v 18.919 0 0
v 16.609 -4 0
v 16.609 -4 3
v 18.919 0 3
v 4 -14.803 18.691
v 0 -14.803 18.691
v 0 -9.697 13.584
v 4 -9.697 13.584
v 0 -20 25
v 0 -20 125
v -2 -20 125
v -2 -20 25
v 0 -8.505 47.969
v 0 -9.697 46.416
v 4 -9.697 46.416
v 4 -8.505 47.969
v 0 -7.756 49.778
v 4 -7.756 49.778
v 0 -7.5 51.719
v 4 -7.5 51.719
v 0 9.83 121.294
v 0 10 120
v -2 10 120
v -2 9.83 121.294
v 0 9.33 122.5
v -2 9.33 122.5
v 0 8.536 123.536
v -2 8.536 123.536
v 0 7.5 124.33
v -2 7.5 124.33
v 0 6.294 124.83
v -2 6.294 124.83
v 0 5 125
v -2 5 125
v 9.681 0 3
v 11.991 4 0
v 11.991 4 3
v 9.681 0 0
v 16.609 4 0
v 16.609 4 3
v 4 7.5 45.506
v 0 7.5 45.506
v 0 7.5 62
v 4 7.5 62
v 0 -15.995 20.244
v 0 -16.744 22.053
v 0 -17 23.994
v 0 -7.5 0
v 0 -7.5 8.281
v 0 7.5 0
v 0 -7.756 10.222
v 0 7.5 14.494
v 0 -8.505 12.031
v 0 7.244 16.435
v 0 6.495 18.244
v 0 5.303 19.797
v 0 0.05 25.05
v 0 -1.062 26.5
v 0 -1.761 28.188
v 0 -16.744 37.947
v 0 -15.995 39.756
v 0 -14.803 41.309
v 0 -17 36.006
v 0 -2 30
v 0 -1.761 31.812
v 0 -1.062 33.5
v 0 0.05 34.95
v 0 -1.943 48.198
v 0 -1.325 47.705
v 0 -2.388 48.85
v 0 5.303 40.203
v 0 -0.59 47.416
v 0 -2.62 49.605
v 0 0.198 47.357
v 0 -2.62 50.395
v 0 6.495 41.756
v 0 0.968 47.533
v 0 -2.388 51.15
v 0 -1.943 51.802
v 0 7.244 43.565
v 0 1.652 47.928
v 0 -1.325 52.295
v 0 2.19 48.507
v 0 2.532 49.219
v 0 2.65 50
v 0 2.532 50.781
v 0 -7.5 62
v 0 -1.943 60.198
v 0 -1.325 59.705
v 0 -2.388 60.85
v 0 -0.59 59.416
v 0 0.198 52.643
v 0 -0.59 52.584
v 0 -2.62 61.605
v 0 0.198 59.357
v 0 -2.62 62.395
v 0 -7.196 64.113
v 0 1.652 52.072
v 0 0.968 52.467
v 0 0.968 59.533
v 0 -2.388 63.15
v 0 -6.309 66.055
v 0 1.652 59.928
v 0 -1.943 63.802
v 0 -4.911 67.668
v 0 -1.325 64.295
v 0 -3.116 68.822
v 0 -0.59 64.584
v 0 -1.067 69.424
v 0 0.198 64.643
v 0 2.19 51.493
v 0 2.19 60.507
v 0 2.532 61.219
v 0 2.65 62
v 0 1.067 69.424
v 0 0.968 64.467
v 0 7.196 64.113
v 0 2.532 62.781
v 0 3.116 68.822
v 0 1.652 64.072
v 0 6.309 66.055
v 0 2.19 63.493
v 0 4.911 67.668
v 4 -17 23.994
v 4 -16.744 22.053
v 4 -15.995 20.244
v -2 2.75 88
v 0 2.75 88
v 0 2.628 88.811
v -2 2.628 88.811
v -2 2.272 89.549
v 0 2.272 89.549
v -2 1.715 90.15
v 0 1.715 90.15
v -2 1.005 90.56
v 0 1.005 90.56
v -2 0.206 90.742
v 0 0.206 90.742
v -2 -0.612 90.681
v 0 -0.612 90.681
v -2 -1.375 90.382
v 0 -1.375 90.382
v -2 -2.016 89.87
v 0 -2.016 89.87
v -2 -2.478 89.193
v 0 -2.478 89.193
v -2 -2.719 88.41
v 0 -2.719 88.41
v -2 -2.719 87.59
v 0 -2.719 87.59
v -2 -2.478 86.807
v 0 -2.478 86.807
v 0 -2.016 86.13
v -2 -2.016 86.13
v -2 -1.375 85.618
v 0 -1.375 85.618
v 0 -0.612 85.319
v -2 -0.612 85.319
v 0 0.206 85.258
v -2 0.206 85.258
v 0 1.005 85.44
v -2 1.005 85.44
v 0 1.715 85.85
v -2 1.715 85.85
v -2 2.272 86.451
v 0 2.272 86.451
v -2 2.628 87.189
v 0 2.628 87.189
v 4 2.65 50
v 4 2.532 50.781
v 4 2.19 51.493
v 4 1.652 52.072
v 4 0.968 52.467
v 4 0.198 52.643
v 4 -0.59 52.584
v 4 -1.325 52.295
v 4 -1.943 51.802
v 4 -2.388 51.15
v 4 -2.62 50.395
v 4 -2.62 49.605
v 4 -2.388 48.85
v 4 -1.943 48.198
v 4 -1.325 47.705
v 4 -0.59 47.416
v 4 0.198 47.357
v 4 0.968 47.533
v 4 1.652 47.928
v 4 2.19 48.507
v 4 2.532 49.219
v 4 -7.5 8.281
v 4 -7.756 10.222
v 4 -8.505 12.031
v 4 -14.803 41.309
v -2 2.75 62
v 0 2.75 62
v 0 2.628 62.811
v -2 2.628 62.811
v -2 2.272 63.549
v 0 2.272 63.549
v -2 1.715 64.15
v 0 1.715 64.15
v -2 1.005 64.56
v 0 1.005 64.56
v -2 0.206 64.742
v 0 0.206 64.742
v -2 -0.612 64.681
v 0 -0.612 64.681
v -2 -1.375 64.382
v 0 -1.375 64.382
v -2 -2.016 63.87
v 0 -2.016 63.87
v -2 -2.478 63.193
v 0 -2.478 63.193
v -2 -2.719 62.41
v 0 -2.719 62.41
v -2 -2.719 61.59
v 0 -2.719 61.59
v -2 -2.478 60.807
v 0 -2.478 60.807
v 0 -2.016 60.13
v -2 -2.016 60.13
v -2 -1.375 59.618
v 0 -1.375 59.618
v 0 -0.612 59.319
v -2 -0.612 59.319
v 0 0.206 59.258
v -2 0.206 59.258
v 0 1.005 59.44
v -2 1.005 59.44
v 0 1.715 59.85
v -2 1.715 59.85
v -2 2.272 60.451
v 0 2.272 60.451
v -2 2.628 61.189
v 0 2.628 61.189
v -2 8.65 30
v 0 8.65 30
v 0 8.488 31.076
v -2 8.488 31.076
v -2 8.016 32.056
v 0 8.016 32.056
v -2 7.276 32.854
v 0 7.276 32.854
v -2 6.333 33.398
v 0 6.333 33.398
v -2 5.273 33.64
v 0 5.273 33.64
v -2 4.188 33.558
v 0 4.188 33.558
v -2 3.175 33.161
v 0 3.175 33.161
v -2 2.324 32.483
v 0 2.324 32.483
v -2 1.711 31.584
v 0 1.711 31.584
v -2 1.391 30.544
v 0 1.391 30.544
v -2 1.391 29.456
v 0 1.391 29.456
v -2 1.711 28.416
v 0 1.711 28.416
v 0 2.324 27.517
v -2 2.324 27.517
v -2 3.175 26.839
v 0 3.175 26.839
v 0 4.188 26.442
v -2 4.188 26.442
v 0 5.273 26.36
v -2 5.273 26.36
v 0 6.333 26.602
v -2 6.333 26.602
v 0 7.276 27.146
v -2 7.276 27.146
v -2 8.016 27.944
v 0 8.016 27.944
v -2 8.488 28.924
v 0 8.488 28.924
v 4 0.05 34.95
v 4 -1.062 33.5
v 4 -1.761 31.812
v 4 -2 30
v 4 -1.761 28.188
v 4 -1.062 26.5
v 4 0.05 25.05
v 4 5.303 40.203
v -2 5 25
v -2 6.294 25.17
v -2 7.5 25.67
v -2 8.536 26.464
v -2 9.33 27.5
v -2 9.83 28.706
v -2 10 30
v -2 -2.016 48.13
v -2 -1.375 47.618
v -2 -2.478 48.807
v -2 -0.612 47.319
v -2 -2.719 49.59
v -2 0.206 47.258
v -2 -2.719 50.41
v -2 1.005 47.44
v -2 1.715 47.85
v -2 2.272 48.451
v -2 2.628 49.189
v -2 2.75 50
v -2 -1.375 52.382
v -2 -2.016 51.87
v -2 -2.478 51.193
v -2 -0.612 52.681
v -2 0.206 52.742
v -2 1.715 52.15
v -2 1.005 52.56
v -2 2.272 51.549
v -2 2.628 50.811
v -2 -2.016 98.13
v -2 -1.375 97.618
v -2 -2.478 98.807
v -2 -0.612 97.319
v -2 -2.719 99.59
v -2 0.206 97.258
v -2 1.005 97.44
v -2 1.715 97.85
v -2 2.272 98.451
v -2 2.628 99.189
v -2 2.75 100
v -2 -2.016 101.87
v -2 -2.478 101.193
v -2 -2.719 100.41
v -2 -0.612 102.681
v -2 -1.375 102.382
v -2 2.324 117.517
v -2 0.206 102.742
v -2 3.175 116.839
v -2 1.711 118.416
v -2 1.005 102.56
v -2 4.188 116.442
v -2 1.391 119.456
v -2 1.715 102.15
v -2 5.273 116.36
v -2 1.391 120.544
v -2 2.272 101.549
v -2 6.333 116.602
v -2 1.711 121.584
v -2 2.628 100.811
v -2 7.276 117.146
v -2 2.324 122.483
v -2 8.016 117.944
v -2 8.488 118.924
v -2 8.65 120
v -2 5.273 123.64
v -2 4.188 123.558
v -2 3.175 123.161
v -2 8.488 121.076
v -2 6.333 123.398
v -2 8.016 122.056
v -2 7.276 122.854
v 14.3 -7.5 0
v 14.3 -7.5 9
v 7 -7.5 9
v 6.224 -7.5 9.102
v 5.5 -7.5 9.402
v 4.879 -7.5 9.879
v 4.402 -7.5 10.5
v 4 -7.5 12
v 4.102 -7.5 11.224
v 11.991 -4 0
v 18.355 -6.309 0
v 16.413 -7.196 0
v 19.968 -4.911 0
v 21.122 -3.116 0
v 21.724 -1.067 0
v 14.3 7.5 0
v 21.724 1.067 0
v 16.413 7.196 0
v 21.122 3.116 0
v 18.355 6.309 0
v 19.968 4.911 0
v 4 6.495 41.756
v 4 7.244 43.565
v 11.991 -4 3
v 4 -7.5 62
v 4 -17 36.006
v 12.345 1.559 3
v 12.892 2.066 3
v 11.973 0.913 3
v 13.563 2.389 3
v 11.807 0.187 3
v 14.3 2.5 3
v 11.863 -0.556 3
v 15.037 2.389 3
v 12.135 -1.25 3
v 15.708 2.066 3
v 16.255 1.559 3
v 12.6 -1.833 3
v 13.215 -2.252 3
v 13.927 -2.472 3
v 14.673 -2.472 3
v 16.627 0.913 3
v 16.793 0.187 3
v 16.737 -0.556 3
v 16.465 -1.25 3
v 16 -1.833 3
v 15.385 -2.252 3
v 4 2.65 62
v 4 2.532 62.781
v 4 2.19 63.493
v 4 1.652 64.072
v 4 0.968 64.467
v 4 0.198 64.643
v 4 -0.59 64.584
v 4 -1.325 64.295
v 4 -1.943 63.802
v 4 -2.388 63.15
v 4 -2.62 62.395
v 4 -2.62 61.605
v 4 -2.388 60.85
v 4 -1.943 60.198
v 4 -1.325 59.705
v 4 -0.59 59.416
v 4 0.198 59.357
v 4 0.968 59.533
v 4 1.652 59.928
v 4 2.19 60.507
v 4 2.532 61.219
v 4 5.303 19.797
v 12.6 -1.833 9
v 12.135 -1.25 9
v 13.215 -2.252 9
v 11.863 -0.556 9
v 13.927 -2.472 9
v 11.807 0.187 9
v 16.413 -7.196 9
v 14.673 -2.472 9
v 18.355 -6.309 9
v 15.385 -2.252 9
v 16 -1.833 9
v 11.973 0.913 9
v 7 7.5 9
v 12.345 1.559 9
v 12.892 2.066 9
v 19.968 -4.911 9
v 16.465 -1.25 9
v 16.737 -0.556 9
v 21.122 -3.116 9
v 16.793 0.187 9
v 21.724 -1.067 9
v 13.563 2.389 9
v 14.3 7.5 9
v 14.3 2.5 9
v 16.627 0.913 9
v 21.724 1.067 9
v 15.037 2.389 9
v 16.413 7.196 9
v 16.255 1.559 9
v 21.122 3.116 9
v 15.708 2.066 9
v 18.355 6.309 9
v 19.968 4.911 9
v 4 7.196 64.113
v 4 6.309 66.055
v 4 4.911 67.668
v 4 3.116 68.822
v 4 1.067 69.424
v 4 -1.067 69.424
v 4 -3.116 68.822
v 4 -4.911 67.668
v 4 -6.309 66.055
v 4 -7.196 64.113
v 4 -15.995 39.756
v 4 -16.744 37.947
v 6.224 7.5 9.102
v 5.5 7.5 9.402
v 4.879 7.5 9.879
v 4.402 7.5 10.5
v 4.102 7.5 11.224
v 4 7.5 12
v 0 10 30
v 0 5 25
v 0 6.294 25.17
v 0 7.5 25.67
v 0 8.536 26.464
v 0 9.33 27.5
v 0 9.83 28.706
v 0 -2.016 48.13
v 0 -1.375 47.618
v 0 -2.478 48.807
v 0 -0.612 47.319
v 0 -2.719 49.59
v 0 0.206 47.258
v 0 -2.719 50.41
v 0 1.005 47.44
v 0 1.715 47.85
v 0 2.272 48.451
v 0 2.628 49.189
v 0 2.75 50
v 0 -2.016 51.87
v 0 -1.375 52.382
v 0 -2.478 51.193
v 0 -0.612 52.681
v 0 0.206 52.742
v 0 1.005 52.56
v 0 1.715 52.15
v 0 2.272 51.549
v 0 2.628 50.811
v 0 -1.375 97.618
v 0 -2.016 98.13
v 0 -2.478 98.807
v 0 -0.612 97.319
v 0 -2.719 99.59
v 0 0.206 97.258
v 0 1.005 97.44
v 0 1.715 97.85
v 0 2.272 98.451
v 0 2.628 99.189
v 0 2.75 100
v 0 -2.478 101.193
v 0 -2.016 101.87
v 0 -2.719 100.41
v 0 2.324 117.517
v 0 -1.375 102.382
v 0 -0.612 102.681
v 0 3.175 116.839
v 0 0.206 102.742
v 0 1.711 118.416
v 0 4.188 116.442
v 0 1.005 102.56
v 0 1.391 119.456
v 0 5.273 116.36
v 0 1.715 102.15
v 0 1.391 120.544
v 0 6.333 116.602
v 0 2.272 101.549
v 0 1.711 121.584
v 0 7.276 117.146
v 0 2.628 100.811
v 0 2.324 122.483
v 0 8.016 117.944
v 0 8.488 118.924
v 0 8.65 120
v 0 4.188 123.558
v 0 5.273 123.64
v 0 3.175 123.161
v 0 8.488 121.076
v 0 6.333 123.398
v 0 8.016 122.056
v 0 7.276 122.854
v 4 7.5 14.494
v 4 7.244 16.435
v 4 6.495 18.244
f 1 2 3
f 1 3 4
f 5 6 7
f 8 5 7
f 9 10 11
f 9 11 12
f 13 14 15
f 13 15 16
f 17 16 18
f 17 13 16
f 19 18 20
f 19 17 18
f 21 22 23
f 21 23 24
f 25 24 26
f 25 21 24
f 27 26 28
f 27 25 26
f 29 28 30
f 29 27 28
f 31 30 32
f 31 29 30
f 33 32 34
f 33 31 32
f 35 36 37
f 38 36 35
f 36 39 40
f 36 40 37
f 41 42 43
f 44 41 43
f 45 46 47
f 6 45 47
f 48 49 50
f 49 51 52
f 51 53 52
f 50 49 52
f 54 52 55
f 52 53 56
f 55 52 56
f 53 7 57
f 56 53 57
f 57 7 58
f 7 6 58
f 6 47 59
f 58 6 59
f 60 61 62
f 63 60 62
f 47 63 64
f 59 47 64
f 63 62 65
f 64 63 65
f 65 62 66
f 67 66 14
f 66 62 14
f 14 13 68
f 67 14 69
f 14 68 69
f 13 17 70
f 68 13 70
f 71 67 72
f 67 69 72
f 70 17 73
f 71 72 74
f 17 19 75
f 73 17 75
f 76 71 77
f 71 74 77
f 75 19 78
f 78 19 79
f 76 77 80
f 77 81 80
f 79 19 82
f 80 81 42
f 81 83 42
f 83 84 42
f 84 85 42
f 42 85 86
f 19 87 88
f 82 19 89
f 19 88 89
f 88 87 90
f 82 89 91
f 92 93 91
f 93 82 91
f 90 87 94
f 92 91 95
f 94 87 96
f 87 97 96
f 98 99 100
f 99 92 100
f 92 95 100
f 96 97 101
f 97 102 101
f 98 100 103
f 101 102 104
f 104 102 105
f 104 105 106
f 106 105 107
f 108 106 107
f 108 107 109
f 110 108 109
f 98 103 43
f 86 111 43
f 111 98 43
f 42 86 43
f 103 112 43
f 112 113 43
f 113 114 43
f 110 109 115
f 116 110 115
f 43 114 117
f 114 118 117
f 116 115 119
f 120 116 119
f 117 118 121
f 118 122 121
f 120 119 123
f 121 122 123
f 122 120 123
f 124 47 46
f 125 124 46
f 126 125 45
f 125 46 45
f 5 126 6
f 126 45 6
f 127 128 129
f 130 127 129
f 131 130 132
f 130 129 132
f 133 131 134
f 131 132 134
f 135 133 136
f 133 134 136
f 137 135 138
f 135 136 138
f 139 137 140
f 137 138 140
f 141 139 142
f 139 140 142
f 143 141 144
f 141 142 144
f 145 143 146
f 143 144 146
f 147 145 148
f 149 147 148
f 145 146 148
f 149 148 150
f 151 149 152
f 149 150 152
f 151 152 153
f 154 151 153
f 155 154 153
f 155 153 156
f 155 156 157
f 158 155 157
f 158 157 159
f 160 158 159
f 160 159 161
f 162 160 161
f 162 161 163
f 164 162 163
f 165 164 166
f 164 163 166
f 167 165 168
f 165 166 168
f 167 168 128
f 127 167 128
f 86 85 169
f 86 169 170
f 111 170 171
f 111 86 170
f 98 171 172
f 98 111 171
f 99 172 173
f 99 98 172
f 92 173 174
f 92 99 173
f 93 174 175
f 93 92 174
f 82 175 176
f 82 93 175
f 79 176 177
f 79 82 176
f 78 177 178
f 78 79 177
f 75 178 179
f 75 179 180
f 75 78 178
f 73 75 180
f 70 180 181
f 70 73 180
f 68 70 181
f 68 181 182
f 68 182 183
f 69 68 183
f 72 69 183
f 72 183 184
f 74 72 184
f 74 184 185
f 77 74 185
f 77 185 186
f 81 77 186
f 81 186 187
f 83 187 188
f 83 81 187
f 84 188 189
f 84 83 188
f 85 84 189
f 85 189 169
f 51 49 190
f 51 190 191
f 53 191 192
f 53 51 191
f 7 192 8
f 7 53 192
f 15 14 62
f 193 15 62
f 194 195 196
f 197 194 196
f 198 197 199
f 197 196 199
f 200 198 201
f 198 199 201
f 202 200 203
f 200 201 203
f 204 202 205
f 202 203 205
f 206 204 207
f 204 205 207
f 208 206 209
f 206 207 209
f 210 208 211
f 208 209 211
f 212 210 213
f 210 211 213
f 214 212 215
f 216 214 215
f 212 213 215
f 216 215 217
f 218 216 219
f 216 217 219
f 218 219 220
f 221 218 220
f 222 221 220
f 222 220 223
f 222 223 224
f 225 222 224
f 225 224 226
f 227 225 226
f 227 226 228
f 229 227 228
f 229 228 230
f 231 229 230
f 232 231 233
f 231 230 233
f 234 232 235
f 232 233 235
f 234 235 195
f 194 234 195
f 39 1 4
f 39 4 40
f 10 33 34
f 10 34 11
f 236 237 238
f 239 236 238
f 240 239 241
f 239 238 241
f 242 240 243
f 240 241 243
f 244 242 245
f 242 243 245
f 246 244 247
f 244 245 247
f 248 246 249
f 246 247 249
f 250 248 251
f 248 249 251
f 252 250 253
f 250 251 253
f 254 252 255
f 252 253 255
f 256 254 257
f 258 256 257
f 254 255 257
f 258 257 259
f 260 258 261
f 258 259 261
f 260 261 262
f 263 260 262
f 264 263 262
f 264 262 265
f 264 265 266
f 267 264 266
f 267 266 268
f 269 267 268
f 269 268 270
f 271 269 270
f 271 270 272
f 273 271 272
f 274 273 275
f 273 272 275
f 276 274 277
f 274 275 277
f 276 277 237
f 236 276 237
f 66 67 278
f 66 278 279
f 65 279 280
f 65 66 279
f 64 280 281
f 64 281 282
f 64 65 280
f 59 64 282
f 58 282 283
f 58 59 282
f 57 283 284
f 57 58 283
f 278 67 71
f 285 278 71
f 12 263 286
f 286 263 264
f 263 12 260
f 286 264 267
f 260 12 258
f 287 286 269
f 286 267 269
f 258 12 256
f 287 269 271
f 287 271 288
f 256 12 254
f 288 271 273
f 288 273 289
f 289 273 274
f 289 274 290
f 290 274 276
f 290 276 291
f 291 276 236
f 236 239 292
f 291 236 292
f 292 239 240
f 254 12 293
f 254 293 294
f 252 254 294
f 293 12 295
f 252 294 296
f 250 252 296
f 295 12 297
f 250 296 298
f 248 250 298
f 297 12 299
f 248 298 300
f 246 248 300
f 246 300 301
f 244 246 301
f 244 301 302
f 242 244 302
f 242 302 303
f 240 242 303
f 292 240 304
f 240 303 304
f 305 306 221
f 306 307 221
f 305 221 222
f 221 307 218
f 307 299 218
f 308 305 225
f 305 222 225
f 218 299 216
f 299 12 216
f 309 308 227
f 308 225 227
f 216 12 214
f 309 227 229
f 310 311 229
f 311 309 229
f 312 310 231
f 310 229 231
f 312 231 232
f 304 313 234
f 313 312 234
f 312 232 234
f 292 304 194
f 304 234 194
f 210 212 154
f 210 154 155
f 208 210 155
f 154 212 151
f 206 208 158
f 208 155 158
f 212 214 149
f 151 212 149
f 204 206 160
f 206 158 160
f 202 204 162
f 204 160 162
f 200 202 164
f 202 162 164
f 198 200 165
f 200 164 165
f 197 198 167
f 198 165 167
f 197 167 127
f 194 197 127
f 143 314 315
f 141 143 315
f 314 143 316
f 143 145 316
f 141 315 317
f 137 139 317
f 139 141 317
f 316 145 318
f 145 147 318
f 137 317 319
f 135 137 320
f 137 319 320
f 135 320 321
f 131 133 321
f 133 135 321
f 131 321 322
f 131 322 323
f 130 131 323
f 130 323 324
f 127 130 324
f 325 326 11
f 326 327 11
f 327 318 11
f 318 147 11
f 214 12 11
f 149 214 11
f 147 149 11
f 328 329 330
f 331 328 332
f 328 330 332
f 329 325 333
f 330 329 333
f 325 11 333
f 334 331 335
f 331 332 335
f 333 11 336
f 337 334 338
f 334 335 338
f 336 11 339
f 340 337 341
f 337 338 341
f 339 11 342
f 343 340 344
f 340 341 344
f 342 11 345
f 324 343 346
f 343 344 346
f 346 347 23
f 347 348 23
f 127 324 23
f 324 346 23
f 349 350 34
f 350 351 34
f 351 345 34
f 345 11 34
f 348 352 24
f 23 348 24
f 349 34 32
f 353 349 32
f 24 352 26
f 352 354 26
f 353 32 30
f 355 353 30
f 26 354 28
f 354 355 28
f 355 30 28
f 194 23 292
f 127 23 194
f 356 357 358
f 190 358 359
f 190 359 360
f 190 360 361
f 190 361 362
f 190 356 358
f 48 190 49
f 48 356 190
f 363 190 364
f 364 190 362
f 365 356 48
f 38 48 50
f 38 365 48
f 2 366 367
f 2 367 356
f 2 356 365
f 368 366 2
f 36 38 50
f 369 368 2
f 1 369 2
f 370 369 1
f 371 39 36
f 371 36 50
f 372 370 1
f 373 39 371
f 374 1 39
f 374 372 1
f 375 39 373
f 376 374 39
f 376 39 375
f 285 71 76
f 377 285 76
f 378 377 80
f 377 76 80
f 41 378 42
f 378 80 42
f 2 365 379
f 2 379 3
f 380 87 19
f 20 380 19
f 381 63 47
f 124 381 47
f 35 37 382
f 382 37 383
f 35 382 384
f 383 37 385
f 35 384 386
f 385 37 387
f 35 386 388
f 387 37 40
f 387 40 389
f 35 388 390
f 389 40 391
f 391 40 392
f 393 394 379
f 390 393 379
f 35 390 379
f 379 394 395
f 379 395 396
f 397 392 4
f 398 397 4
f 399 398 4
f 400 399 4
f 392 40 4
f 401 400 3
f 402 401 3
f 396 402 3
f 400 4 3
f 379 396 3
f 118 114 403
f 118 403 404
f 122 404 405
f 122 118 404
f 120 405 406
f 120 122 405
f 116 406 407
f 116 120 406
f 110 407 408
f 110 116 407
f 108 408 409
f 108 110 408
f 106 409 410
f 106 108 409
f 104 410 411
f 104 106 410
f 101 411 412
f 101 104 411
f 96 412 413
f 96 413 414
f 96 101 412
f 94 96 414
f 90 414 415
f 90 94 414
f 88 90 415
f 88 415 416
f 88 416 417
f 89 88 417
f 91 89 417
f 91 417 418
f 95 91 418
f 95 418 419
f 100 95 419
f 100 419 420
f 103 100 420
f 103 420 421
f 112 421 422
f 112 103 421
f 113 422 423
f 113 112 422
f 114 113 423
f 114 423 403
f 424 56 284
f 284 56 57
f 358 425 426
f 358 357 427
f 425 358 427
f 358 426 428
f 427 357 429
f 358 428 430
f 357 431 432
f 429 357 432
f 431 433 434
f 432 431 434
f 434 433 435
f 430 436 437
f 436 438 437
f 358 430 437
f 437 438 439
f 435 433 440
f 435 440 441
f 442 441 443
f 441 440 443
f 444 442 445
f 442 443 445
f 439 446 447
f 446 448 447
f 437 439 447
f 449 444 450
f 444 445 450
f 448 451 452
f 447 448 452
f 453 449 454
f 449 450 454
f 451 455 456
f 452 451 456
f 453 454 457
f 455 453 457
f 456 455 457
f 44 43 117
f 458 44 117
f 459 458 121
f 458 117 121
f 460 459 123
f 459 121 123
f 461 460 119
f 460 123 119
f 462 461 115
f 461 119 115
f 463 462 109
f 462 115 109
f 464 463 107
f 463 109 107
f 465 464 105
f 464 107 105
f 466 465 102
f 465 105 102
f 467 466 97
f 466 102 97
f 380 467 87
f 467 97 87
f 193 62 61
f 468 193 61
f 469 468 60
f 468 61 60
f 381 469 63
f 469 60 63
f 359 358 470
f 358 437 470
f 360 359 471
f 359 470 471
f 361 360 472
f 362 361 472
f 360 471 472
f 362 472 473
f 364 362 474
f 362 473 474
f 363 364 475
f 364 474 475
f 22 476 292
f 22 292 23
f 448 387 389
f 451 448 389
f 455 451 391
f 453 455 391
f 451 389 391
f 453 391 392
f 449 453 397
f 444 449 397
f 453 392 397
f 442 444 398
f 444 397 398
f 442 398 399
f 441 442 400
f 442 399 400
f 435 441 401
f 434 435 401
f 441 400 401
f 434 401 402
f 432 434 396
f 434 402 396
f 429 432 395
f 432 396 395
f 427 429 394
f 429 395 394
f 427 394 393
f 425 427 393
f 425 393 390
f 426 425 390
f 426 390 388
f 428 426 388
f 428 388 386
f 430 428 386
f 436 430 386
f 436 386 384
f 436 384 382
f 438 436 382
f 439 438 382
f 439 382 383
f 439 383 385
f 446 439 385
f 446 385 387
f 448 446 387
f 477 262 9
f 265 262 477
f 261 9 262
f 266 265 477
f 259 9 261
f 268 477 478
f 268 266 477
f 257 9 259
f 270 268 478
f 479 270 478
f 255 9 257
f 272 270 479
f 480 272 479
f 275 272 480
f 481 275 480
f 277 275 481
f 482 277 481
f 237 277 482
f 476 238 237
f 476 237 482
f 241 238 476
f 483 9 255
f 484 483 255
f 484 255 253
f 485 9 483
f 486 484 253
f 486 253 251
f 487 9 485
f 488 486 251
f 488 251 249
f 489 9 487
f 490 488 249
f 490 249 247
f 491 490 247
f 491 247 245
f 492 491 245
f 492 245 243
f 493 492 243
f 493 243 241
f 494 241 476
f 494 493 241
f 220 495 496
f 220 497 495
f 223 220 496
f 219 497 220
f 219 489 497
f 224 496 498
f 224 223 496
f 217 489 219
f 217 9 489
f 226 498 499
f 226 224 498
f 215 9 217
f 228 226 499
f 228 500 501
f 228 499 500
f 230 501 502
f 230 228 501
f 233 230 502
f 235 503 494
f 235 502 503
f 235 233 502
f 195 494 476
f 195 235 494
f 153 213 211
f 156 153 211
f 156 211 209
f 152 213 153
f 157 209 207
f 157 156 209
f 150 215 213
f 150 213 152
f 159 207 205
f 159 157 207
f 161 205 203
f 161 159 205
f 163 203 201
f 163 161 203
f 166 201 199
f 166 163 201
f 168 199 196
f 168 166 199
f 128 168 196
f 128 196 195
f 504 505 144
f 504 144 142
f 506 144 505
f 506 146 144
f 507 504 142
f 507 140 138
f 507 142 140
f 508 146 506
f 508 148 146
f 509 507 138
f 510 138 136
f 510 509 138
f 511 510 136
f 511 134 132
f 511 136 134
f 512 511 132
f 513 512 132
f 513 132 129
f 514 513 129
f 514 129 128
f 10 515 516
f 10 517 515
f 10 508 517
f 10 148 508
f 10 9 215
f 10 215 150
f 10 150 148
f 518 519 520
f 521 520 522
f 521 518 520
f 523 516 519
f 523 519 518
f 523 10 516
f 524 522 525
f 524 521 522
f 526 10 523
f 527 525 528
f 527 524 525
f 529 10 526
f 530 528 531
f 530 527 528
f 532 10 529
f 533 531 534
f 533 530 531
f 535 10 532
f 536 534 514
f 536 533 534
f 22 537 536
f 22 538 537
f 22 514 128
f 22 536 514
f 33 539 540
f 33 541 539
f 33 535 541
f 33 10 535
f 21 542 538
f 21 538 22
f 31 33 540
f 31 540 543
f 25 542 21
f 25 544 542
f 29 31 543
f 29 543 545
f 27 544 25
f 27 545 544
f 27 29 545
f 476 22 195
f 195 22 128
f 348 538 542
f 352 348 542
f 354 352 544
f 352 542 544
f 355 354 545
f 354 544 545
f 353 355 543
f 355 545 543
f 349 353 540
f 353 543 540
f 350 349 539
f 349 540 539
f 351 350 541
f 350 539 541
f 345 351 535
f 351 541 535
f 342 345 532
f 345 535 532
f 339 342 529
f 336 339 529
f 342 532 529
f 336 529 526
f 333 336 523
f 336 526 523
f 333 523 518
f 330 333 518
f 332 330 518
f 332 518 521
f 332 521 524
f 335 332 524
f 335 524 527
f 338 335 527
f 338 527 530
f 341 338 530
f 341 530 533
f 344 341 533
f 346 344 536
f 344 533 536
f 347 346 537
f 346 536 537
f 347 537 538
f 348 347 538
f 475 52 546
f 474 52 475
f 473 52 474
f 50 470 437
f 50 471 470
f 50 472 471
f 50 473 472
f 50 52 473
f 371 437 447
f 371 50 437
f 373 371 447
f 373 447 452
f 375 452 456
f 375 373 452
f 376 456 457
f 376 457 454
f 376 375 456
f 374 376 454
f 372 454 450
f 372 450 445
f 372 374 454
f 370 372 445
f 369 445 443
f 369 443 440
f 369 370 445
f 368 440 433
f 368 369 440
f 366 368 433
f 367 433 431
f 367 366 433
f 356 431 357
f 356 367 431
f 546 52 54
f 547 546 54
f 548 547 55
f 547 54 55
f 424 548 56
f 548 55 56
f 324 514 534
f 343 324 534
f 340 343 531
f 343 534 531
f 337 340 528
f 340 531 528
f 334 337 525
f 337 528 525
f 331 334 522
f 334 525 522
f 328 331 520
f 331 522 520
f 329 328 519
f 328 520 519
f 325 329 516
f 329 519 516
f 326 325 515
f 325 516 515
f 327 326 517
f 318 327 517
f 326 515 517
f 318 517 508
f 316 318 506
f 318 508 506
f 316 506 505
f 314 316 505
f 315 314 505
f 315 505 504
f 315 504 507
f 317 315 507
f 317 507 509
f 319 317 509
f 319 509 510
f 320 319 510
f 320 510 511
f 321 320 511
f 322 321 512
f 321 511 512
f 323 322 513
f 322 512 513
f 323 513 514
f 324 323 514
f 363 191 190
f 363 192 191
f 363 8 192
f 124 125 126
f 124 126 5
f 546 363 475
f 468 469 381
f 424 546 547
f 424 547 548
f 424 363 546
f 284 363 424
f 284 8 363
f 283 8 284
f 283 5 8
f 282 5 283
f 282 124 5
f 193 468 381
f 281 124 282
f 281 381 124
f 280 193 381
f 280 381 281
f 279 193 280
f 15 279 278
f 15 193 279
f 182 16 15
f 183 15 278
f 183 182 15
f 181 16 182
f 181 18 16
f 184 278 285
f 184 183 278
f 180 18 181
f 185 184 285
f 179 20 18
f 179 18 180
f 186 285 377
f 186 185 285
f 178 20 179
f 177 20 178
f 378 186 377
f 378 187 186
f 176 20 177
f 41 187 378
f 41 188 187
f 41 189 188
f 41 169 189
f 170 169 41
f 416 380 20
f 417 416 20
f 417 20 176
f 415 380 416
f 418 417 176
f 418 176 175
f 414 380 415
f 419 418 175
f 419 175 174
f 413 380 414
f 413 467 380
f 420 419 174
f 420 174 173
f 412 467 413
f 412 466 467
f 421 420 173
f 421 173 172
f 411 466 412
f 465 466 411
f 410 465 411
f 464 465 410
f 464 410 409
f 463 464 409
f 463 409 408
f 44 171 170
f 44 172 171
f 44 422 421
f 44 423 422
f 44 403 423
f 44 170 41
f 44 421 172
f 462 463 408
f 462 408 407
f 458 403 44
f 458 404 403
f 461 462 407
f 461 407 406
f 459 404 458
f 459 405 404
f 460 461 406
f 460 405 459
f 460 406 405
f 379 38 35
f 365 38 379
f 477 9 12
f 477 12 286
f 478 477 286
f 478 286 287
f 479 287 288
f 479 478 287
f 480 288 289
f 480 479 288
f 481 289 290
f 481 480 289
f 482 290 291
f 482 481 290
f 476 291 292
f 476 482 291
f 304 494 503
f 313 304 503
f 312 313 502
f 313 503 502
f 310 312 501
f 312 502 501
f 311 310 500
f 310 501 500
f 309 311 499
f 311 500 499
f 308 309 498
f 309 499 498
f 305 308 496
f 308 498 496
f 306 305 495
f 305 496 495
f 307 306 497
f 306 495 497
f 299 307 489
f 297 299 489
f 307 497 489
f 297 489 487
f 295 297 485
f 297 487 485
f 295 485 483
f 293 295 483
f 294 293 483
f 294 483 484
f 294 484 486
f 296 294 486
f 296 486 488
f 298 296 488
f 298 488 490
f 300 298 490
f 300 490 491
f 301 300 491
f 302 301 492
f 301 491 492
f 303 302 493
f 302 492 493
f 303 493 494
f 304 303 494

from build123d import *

# Parameters (mm, degrees)
SKETCH_R     = 2.75
SKETCH_R_2   = 3.65
PAD_DEPTH    = 2
SKETCH001_R  = 2.65
PAD001_DEPTH = 4
SKETCH002_R  = 2.5
PAD002_DEPTH = 9
POCKET_DEPTH = 3
FILLET_R     = 3


with BuildPart() as z_plate:
    # Sketch → Pad (new body)
    with BuildSketch(Plane.YZ):
        with BuildLine():
            Line((-20, 25), (5, 25))
            ThreePointArc((5, 25), (8.535534, 26.464466), (10, 30))
            Line((10, 30), (10, 120))
            ThreePointArc((10, 120), (8.535534, 123.535534), (5, 125))
            Line((5, 125), (-20, 125))
            Line((-20, 125), (-20, 25))
        make_face()
        with Locations((0, 100)):
            Circle(SKETCH_R, mode=Mode.SUBTRACT)
        with Locations((0, 88)):
            Circle(SKETCH_R, mode=Mode.SUBTRACT)
        with Locations((0, 62)):
            Circle(SKETCH_R, mode=Mode.SUBTRACT)
        with Locations((0, 50)):
            Circle(SKETCH_R, mode=Mode.SUBTRACT)
        with Locations((5, 120)):
            Circle(SKETCH_R_2, mode=Mode.SUBTRACT)
        with Locations((5, 30)):
            Circle(SKETCH_R_2, mode=Mode.SUBTRACT)
    extrude(amount=-PAD_DEPTH)


with BuildPart() as z_endstop_screw_mount:
    # Sketch001 → Pad001 (new body)
    with BuildSketch(Plane.YZ):
        with BuildLine():
            Line((-7.5, 62), (-7.5, 51.7193))
            ThreePointArc((-9.696699, 46.415999), (-8.070904, 48.849174), (-7.5, 51.7193))
            Line((-9.696699, 46.415999), (-14.803301, 41.309398))
            ThreePointArc((-14.803301, 41.309398), (-16.429096, 38.876222), (-17, 36.006097))
            Line((-17, 36.006097), (-17, 23.993903))
            ThreePointArc((-17, 23.993903), (-16.429096, 21.123778), (-14.803301, 18.690602))
            Line((-14.803301, 18.690602), (-9.696699, 13.584001))
            ThreePointArc((-7.5, 8.2807), (-8.070904, 11.150826), (-9.696699, 13.584001))
            Line((-7.5, 8.2807), (-7.5, 0))
            Line((-7.5, 0), (7.5, 0))
            Line((7.5, 0), (7.5, 14.493903))
            ThreePointArc((7.5, 14.493903), (6.929096, 17.364029), (5.303301, 19.797204))
            Line((5.303301, 19.797204), (0.050253, 25.050253))
            ThreePointArc((0.050253, 34.949747), (-2, 30), (0.050253, 25.050253))
            Line((0.050253, 34.949747), (5.303301, 40.202796))
            ThreePointArc((5.303301, 40.202796), (6.929096, 42.635971), (7.5, 45.506097))
            Line((7.5, 45.506097), (7.5, 62))
            ThreePointArc((7.5, 62), (0, 69.5), (-7.5, 62))
        make_face()
        with Locations((0, 62)):
            Circle(SKETCH001_R, mode=Mode.SUBTRACT)
        with Locations((0, 50)):
            Circle(SKETCH001_R, mode=Mode.SUBTRACT)
    extrude(amount=PAD001_DEPTH)

    # Sketch002 → Pad002 (new body)
    with BuildSketch(Plane.YX):
        with BuildLine():
            Line((-7.5, 14.3), (-7.5, 4))
            Line((-7.5, 4), (7.5, 4))
            Line((7.5, 4), (7.5, 14.3))
            ThreePointArc((7.5, 14.3), (0, 21.8), (-7.5, 14.3))
        make_face()
        with Locations((0, 14.3)):
            Circle(SKETCH002_R, mode=Mode.SUBTRACT)
    extrude(amount=-PAD002_DEPTH)

    # Sketch003 → Pocket (cut)
    with BuildSketch(Plane.YX):
        Polygon((-4, 11.990599), (-4, 16.609401), (0, 18.918802), (4, 16.609401), (4, 11.990599), (0, 9.681198), align=None)
    extrude(amount=-POCKET_DEPTH, mode=Mode.SUBTRACT)

    # Fillet
    fillet_edges = [z_endstop_screw_mount.edges().sort_by_distance(p)[0] for p in [
        (4, 0, 9),
    ]]
    fillet(fillet_edges, radius=FILLET_R)


solid = Compound([z_plate.part, z_endstop_screw_mount.part])
